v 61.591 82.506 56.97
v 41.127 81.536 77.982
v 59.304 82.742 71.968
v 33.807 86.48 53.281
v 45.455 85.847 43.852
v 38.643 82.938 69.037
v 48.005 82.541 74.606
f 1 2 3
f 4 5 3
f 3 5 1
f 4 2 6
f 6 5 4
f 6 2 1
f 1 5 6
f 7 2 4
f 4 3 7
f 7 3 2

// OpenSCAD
// Auto-generated auxetic polyhedron
points = [
    [59.304388, 82.741705, 71.967505],
    [41.127082, 81.535986, 77.982240],
    [61.590606, 82.506013, 56.969678],
    [45.455094, 85.847391, 43.852456],
    [33.806749, 86.479779, 53.281198],
    [38.643295, 82.937555, 69.036769],
    [48.005421, 82.540860, 74.605854],
];

faces = [
    [0, 1, 2],
    [0, 3, 4],
    [2, 3, 0],
    [5, 1, 4],
    [4, 3, 5],
    [2, 1, 5],
    [5, 3, 2],
    [4, 1, 6],
    [6, 0, 4],
    [1, 0, 6],
];

polyhedron(points = points, faces = faces);
